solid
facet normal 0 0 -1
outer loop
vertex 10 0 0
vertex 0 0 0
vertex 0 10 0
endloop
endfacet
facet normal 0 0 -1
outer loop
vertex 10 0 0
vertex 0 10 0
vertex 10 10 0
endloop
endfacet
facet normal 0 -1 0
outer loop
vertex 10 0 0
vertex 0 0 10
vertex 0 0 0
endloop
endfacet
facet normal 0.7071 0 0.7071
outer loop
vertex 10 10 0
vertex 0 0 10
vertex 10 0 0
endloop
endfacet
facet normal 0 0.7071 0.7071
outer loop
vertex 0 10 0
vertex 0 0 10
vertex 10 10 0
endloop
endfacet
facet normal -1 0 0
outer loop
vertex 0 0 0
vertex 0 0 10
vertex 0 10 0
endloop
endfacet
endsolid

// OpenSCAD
//2d shapes

//circle(r = 10);

//square([10,20]);

p1 = [10,-10];
p2 = [20,20];
p3 = [-10,0];

//polygon([p1,p2,p3]);

//linear_extrude(20) circle(10, $fn = 5);

//linear_extrude(10, twist = 45, slices = 100, scale = [1.0, 2.0]) circle(10,$fn=5);

//linear_extrude(10, twist = 45, slices = 100, scale = [1.0, 1.0],center=false) translate([10,10,0])circle(10, $fn=4);

linear_extrude(10, scale = [0,0]) square([10,10]);
